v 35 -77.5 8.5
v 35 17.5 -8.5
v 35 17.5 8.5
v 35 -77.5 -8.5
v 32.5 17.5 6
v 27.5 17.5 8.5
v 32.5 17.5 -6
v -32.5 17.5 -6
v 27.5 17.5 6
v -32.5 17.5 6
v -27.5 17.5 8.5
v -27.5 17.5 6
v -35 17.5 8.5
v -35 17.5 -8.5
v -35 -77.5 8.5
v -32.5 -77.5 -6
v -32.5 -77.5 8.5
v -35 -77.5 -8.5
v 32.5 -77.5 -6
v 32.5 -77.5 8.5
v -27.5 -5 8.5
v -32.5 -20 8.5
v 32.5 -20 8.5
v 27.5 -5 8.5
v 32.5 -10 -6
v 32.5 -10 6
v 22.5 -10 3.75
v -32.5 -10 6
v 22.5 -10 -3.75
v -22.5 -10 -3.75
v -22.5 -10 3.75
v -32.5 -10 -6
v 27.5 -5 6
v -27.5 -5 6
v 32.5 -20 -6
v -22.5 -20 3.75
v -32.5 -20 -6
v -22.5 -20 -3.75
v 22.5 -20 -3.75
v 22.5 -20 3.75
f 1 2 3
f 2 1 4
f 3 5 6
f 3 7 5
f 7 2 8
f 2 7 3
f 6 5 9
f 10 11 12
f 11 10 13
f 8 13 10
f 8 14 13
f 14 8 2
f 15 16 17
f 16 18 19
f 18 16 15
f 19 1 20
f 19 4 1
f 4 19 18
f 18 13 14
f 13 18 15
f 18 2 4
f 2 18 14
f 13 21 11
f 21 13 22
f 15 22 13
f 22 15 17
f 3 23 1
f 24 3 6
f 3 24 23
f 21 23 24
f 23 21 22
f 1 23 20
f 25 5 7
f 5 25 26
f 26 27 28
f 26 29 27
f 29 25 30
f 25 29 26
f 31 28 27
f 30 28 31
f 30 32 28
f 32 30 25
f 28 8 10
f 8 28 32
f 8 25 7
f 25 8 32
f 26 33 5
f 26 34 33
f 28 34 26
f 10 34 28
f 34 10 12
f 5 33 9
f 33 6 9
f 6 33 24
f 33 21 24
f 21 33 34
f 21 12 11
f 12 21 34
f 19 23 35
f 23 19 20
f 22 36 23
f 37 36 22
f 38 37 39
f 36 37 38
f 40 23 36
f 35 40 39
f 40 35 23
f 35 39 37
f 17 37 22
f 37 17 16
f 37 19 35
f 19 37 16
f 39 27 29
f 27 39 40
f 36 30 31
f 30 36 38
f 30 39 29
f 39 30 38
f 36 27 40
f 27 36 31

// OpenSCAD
iphone_size_x = 65;
iphone_size_y = 12;
iphone_size_z = 30;

hole_size_x = 45;
hole_size_y = 7.5;

iphone_cable_z = 60;

screen_size_x = 55;
screen_pos_z = 5;

box_over = 5;

rotate([-90, 0, 0]) {
    difference() {
        translate([0, 0, -iphone_cable_z/2])
            cube([iphone_size_x+box_over, iphone_size_y+box_over, iphone_size_z+box_over+iphone_cable_z], center=true);
        translate([0, 0, box_over])
            cube([iphone_size_x, iphone_size_y, iphone_size_z], center=true);
        translate([0, -box_over, box_over*2])
            cube([screen_size_x, iphone_size_y, iphone_size_z], center=true);
        translate([0, -box_over/2, -(iphone_cable_z/2)-box_over*4])
            cube([iphone_size_x, iphone_size_y+box_over, iphone_cable_z], center=true);
        translate([0, 0, -(iphone_cable_z/2)])
            cube([hole_size_x, hole_size_y, iphone_cable_z], center=true);
    }
}
